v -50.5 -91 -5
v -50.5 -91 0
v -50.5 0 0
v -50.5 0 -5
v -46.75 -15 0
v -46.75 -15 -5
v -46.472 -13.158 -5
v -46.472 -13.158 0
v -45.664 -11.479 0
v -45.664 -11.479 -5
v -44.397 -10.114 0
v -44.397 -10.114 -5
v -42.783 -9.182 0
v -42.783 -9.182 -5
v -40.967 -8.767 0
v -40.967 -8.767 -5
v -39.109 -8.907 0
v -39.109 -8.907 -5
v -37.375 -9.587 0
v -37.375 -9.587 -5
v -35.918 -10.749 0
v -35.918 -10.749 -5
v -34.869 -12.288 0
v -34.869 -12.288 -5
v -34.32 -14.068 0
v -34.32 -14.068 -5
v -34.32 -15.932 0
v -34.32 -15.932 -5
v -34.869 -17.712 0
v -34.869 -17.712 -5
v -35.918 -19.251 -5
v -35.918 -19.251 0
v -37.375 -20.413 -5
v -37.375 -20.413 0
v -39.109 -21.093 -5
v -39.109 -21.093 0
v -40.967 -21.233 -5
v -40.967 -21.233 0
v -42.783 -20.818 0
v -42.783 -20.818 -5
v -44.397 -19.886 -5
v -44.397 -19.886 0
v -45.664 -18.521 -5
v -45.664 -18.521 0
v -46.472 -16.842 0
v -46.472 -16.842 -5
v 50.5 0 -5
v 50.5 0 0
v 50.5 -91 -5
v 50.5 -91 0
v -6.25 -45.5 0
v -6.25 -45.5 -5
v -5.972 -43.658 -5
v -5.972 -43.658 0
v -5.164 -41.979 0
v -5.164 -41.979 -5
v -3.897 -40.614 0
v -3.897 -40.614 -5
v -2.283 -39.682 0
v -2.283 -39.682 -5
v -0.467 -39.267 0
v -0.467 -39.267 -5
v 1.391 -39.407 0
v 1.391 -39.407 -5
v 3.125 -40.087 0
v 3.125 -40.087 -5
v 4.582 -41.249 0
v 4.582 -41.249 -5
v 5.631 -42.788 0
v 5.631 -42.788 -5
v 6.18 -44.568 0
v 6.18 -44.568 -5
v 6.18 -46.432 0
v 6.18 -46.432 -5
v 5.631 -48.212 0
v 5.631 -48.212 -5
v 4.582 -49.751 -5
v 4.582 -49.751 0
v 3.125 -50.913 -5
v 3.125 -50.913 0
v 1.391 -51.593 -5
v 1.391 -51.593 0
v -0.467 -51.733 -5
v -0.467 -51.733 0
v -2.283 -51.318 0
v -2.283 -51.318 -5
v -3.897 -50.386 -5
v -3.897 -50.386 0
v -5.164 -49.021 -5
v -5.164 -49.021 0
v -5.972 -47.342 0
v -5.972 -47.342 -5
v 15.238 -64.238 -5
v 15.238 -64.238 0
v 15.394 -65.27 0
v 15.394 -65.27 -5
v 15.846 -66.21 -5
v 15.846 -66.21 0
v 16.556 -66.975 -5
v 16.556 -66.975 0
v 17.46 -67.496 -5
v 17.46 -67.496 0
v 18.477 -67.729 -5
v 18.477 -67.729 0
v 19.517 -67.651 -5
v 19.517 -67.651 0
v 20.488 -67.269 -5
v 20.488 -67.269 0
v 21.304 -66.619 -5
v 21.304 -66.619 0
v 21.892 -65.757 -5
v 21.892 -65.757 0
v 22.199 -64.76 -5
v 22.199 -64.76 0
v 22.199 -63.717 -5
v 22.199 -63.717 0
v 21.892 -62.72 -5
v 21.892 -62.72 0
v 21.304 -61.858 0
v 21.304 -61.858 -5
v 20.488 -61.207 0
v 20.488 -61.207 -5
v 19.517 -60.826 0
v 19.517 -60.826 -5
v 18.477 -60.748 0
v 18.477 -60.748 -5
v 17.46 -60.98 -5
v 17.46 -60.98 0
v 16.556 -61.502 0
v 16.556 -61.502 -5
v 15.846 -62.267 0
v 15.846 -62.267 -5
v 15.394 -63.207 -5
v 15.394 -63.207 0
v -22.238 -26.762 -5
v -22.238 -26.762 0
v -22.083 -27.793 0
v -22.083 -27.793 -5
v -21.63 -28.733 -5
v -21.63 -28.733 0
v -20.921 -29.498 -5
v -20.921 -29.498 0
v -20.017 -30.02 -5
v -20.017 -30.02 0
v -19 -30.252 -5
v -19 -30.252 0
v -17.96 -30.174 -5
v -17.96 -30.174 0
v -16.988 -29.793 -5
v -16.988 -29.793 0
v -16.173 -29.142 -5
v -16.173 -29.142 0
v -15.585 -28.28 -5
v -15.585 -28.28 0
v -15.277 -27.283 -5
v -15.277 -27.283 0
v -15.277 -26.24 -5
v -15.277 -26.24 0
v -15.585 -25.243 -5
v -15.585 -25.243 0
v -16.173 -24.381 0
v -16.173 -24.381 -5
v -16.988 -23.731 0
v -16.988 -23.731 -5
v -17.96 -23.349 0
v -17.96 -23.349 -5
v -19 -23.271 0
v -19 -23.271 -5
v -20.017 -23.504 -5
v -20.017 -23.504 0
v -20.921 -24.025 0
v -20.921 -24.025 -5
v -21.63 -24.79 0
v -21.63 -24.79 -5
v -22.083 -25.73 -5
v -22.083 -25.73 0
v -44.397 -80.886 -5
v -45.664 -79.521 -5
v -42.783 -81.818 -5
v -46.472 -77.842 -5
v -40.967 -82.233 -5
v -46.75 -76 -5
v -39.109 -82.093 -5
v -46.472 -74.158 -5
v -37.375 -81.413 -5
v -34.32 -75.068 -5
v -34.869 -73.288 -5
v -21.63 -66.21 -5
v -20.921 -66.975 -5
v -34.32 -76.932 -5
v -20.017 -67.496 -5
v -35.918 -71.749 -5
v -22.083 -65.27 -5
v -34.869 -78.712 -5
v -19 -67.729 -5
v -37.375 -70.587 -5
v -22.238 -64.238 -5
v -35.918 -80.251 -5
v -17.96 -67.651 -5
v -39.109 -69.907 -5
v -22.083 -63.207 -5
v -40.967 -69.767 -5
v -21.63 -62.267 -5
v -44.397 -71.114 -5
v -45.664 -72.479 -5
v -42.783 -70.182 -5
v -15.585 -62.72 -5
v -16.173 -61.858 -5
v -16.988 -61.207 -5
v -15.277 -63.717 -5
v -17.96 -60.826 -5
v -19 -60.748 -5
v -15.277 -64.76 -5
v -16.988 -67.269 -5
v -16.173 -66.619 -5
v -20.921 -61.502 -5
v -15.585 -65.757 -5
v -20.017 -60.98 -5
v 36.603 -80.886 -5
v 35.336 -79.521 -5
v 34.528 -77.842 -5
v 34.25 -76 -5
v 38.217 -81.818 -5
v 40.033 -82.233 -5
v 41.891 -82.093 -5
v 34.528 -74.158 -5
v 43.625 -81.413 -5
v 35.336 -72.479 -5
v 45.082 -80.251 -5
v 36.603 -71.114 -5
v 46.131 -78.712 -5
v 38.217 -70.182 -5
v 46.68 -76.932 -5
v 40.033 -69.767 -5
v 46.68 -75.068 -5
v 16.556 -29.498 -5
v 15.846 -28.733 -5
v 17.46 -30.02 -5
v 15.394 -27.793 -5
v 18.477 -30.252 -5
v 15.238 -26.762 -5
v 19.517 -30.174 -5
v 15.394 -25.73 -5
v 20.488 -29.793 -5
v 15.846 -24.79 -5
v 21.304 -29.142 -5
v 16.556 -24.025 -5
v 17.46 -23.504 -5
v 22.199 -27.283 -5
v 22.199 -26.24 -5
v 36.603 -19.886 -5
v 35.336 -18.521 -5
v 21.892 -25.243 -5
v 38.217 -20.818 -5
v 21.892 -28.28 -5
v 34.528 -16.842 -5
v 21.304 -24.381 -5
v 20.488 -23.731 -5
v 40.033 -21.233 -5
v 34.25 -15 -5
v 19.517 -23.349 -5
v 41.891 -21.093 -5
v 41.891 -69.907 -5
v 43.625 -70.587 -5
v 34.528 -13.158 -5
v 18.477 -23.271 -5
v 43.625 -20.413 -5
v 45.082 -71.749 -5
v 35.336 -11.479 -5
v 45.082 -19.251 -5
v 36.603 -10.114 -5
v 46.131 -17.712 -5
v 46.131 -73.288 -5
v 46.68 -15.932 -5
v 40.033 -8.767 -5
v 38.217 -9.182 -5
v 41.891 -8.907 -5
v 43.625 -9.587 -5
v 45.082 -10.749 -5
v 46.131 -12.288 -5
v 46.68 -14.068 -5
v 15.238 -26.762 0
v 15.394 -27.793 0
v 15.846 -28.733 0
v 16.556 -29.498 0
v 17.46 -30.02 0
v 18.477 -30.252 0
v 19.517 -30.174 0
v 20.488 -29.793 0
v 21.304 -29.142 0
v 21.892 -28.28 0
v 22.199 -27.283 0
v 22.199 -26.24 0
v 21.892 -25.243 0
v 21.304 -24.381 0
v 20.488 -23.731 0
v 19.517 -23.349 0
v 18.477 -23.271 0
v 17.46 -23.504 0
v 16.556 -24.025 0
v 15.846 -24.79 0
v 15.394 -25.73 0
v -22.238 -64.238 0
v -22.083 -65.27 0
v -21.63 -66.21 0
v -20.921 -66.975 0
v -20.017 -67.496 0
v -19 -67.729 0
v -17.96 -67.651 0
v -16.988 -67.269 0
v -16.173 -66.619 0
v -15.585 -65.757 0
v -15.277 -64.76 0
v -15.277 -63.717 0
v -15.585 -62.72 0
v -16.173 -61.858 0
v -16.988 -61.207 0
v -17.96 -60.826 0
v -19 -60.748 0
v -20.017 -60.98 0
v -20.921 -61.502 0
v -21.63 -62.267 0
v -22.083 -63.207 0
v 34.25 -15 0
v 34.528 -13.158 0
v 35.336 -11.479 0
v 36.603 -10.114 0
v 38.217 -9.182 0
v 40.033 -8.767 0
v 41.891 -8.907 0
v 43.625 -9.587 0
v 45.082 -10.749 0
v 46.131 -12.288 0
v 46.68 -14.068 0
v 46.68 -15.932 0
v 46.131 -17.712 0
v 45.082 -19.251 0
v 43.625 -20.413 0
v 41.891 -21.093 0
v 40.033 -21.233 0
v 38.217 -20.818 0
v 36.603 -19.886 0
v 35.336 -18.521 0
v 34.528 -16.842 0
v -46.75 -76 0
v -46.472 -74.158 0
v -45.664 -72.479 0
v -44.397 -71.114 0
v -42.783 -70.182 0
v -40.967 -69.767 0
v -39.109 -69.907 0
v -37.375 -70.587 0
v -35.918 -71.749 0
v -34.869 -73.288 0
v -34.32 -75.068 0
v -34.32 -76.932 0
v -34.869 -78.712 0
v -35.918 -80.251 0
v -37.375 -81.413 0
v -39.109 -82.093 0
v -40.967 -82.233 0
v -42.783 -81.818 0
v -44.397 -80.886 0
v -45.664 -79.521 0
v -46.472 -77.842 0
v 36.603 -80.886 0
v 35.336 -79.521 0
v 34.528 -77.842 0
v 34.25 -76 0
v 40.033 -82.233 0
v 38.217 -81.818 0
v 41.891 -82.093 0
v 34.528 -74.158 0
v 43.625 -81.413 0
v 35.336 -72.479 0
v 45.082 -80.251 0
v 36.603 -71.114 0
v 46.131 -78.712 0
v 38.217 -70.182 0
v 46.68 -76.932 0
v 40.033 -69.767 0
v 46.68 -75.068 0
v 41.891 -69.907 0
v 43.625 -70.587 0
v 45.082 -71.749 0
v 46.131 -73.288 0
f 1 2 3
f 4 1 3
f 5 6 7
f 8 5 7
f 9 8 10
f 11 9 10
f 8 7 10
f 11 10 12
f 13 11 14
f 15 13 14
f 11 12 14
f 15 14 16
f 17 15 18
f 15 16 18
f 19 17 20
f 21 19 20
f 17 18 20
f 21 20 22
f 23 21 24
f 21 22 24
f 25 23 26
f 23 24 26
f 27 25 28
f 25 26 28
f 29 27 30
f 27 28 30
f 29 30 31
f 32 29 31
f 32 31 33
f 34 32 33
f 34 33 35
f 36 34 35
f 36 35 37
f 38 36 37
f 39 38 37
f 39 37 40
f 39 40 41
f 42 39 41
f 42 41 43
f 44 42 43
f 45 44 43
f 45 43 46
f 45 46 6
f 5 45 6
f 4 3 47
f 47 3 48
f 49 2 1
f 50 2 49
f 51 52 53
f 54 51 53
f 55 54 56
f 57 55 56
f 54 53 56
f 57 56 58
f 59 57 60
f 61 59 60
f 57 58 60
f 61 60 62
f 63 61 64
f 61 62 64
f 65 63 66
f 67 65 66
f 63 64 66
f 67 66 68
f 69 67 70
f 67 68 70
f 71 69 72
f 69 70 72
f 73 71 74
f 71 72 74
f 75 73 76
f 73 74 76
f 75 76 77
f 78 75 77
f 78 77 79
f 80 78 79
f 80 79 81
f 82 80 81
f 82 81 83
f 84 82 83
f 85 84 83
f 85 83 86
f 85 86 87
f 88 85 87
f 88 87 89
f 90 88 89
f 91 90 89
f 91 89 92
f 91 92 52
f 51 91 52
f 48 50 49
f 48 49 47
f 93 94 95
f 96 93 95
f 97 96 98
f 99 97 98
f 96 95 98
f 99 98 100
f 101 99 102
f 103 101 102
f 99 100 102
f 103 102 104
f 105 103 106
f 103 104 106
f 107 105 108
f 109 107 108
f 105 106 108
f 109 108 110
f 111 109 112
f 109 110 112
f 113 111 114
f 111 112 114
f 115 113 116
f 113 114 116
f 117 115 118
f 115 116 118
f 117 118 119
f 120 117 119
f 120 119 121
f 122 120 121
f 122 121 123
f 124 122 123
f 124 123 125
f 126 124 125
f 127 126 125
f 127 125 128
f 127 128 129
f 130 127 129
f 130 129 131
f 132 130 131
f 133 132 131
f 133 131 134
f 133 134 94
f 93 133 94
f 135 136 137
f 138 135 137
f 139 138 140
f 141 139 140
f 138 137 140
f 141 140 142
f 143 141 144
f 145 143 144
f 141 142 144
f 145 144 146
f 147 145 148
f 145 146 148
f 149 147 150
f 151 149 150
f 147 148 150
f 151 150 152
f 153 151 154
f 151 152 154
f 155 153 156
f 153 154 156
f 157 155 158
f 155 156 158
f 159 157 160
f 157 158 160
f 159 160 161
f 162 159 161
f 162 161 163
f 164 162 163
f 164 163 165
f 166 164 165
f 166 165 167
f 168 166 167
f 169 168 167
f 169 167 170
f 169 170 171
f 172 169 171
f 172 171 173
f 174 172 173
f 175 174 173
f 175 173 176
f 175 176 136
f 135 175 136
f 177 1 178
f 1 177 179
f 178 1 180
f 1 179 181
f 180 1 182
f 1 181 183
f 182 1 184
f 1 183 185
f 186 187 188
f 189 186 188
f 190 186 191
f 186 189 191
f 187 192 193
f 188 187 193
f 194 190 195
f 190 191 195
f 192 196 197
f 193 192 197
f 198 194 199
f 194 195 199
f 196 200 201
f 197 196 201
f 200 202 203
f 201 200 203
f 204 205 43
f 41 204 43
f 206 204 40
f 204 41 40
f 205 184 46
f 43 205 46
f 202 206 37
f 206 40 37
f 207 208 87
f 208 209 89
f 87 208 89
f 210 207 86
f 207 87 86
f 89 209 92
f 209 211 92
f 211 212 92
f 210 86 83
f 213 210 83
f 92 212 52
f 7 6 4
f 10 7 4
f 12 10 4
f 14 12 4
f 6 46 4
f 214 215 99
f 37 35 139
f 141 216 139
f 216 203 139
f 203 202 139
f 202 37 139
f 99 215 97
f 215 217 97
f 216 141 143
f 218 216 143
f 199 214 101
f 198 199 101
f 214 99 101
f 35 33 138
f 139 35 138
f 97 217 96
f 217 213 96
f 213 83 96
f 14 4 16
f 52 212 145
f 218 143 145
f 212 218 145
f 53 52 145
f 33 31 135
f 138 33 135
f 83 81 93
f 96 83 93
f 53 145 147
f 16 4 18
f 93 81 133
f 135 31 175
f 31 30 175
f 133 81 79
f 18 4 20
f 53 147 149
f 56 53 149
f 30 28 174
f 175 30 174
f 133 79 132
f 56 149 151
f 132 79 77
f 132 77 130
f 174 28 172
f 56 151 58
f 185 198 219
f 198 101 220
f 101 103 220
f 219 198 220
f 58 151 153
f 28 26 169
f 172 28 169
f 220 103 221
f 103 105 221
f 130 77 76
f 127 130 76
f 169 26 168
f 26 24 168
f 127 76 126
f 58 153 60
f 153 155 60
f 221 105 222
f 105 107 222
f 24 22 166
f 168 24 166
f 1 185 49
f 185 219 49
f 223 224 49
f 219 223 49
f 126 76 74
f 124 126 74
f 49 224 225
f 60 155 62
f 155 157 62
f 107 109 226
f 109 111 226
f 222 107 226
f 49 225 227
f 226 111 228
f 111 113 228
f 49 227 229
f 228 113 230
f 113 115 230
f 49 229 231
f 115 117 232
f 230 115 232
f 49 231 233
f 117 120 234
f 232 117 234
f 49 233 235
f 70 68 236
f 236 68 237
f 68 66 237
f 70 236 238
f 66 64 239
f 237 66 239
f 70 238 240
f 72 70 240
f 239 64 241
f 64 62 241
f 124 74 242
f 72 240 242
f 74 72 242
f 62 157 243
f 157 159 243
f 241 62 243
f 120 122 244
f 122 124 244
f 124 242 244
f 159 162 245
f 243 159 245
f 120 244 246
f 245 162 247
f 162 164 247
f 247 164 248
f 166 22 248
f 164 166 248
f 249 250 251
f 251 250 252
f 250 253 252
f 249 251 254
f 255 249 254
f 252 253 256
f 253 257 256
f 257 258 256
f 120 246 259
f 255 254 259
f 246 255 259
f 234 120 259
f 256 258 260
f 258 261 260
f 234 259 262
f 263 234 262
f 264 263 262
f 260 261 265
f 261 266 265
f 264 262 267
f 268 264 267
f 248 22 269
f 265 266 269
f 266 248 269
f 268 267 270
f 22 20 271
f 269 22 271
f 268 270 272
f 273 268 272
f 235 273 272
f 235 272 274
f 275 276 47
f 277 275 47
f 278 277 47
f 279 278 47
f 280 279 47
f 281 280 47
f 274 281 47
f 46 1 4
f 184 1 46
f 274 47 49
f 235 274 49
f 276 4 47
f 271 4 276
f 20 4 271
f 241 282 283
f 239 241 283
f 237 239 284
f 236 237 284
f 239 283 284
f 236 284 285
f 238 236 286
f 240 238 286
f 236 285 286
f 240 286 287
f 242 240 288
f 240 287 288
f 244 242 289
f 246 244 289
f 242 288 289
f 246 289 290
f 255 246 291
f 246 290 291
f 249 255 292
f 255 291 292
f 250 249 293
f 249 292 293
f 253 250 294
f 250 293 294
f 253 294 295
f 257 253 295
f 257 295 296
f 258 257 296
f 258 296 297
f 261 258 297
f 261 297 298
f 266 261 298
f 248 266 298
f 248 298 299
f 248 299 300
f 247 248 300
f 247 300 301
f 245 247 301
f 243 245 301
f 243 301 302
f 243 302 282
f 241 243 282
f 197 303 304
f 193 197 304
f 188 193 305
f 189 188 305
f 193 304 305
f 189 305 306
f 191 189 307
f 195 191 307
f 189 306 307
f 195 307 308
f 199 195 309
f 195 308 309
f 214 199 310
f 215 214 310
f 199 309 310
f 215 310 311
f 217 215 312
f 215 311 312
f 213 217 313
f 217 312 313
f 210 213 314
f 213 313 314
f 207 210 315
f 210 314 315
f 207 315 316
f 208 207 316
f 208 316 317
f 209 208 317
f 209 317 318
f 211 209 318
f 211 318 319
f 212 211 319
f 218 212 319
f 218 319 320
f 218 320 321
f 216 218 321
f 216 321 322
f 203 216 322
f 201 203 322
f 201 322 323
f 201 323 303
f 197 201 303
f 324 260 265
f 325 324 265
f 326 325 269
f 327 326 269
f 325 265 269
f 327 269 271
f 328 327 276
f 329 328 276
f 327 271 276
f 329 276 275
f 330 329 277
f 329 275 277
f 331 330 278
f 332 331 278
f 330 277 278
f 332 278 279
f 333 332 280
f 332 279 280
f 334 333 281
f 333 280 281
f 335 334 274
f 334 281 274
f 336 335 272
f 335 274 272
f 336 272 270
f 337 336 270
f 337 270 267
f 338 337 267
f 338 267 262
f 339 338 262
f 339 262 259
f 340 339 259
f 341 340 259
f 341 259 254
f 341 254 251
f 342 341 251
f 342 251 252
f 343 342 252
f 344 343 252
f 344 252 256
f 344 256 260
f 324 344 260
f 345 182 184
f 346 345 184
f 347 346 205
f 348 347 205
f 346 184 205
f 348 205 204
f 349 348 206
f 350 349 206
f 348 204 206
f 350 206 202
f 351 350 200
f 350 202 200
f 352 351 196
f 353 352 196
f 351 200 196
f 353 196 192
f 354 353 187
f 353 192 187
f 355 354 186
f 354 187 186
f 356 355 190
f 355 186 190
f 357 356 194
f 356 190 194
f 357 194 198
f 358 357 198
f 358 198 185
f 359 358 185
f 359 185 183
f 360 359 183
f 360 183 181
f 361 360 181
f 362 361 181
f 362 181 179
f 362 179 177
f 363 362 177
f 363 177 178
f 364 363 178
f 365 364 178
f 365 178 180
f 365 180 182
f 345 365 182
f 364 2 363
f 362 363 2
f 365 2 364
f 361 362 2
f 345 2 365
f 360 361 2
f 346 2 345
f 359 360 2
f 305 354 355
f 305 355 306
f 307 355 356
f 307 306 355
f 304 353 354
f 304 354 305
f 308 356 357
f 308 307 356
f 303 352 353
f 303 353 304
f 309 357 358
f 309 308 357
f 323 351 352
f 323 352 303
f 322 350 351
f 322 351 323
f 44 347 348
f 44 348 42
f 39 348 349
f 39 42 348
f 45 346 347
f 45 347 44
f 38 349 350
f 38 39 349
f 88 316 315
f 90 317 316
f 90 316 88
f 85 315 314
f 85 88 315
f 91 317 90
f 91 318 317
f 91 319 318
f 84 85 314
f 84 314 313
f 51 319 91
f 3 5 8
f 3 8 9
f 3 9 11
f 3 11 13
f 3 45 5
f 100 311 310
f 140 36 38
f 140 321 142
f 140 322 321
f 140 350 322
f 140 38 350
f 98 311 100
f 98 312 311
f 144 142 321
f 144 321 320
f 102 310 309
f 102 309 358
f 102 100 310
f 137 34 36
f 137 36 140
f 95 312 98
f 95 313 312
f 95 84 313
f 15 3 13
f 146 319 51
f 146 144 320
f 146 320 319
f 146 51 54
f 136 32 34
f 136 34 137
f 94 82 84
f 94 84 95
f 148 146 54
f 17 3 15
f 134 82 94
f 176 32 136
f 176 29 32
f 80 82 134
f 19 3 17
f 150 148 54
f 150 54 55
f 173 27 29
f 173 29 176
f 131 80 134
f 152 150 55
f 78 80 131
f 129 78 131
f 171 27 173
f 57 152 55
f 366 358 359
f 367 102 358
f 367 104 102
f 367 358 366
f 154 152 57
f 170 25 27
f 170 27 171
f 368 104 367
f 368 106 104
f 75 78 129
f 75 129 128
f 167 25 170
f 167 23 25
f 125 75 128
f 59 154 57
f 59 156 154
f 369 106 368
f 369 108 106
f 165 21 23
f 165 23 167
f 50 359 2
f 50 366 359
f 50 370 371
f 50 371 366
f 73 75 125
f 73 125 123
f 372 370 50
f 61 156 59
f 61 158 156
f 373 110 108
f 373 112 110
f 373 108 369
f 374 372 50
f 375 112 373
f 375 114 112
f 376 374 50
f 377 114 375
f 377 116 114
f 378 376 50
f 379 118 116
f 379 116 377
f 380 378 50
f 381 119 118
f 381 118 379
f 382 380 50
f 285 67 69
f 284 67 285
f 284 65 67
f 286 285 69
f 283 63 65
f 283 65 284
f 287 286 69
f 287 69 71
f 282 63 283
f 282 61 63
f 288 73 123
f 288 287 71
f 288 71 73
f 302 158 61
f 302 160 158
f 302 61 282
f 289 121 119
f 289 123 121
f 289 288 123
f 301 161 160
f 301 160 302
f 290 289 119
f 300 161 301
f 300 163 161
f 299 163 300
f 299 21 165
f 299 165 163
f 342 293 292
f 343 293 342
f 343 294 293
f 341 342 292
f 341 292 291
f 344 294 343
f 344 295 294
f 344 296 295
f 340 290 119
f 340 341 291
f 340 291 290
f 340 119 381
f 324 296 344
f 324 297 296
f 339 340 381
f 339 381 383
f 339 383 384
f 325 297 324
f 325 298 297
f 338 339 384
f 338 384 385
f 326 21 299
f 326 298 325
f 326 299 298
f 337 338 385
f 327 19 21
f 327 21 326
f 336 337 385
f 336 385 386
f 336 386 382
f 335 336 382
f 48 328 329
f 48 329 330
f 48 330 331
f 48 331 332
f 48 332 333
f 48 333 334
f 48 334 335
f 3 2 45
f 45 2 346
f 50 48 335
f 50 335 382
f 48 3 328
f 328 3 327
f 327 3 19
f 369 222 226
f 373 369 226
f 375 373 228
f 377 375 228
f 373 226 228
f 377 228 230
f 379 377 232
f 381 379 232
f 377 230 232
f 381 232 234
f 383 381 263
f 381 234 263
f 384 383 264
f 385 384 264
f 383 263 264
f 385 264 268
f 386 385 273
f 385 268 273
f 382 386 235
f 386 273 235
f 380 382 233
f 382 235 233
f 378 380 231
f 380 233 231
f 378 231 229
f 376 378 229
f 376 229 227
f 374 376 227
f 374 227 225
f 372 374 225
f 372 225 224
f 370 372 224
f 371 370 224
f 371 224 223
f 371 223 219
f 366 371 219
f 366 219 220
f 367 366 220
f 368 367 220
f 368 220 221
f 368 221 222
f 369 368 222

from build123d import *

# Parameters (mm, degrees)
F0_W     = 101
F0_H     = 91
F1_DEPTH = 5
F3_D     = 12.5
F5_D     = 7


with BuildPart() as f1:
    # F0 (on Top) → F1 (new body)
    with BuildSketch(Plane.XY):
        with Locations((0, -45.5)):
            Rectangle(F0_W, F0_H)
    extrude(amount=-F1_DEPTH)

    # F3 (through all)
    with Locations(Plane.XY):
        with Locations((-40.5, -76), (40.5, -76), (40.5, -15), (-40.5, -15), (0, -45.5)):
            Hole(F3_D / 2)

    # F5 (through all)
    with Locations(Plane(origin=(0, 0, -5), x_dir=(1, 0, 0), z_dir=(0, 0, -1))):
        with Locations((-18.73833, 64.23833), (-18.73833, 26.76167), (18.73833, 26.76167), (18.73833, 64.23833)):
            Hole(F5_D / 2)


solid = f1.part
